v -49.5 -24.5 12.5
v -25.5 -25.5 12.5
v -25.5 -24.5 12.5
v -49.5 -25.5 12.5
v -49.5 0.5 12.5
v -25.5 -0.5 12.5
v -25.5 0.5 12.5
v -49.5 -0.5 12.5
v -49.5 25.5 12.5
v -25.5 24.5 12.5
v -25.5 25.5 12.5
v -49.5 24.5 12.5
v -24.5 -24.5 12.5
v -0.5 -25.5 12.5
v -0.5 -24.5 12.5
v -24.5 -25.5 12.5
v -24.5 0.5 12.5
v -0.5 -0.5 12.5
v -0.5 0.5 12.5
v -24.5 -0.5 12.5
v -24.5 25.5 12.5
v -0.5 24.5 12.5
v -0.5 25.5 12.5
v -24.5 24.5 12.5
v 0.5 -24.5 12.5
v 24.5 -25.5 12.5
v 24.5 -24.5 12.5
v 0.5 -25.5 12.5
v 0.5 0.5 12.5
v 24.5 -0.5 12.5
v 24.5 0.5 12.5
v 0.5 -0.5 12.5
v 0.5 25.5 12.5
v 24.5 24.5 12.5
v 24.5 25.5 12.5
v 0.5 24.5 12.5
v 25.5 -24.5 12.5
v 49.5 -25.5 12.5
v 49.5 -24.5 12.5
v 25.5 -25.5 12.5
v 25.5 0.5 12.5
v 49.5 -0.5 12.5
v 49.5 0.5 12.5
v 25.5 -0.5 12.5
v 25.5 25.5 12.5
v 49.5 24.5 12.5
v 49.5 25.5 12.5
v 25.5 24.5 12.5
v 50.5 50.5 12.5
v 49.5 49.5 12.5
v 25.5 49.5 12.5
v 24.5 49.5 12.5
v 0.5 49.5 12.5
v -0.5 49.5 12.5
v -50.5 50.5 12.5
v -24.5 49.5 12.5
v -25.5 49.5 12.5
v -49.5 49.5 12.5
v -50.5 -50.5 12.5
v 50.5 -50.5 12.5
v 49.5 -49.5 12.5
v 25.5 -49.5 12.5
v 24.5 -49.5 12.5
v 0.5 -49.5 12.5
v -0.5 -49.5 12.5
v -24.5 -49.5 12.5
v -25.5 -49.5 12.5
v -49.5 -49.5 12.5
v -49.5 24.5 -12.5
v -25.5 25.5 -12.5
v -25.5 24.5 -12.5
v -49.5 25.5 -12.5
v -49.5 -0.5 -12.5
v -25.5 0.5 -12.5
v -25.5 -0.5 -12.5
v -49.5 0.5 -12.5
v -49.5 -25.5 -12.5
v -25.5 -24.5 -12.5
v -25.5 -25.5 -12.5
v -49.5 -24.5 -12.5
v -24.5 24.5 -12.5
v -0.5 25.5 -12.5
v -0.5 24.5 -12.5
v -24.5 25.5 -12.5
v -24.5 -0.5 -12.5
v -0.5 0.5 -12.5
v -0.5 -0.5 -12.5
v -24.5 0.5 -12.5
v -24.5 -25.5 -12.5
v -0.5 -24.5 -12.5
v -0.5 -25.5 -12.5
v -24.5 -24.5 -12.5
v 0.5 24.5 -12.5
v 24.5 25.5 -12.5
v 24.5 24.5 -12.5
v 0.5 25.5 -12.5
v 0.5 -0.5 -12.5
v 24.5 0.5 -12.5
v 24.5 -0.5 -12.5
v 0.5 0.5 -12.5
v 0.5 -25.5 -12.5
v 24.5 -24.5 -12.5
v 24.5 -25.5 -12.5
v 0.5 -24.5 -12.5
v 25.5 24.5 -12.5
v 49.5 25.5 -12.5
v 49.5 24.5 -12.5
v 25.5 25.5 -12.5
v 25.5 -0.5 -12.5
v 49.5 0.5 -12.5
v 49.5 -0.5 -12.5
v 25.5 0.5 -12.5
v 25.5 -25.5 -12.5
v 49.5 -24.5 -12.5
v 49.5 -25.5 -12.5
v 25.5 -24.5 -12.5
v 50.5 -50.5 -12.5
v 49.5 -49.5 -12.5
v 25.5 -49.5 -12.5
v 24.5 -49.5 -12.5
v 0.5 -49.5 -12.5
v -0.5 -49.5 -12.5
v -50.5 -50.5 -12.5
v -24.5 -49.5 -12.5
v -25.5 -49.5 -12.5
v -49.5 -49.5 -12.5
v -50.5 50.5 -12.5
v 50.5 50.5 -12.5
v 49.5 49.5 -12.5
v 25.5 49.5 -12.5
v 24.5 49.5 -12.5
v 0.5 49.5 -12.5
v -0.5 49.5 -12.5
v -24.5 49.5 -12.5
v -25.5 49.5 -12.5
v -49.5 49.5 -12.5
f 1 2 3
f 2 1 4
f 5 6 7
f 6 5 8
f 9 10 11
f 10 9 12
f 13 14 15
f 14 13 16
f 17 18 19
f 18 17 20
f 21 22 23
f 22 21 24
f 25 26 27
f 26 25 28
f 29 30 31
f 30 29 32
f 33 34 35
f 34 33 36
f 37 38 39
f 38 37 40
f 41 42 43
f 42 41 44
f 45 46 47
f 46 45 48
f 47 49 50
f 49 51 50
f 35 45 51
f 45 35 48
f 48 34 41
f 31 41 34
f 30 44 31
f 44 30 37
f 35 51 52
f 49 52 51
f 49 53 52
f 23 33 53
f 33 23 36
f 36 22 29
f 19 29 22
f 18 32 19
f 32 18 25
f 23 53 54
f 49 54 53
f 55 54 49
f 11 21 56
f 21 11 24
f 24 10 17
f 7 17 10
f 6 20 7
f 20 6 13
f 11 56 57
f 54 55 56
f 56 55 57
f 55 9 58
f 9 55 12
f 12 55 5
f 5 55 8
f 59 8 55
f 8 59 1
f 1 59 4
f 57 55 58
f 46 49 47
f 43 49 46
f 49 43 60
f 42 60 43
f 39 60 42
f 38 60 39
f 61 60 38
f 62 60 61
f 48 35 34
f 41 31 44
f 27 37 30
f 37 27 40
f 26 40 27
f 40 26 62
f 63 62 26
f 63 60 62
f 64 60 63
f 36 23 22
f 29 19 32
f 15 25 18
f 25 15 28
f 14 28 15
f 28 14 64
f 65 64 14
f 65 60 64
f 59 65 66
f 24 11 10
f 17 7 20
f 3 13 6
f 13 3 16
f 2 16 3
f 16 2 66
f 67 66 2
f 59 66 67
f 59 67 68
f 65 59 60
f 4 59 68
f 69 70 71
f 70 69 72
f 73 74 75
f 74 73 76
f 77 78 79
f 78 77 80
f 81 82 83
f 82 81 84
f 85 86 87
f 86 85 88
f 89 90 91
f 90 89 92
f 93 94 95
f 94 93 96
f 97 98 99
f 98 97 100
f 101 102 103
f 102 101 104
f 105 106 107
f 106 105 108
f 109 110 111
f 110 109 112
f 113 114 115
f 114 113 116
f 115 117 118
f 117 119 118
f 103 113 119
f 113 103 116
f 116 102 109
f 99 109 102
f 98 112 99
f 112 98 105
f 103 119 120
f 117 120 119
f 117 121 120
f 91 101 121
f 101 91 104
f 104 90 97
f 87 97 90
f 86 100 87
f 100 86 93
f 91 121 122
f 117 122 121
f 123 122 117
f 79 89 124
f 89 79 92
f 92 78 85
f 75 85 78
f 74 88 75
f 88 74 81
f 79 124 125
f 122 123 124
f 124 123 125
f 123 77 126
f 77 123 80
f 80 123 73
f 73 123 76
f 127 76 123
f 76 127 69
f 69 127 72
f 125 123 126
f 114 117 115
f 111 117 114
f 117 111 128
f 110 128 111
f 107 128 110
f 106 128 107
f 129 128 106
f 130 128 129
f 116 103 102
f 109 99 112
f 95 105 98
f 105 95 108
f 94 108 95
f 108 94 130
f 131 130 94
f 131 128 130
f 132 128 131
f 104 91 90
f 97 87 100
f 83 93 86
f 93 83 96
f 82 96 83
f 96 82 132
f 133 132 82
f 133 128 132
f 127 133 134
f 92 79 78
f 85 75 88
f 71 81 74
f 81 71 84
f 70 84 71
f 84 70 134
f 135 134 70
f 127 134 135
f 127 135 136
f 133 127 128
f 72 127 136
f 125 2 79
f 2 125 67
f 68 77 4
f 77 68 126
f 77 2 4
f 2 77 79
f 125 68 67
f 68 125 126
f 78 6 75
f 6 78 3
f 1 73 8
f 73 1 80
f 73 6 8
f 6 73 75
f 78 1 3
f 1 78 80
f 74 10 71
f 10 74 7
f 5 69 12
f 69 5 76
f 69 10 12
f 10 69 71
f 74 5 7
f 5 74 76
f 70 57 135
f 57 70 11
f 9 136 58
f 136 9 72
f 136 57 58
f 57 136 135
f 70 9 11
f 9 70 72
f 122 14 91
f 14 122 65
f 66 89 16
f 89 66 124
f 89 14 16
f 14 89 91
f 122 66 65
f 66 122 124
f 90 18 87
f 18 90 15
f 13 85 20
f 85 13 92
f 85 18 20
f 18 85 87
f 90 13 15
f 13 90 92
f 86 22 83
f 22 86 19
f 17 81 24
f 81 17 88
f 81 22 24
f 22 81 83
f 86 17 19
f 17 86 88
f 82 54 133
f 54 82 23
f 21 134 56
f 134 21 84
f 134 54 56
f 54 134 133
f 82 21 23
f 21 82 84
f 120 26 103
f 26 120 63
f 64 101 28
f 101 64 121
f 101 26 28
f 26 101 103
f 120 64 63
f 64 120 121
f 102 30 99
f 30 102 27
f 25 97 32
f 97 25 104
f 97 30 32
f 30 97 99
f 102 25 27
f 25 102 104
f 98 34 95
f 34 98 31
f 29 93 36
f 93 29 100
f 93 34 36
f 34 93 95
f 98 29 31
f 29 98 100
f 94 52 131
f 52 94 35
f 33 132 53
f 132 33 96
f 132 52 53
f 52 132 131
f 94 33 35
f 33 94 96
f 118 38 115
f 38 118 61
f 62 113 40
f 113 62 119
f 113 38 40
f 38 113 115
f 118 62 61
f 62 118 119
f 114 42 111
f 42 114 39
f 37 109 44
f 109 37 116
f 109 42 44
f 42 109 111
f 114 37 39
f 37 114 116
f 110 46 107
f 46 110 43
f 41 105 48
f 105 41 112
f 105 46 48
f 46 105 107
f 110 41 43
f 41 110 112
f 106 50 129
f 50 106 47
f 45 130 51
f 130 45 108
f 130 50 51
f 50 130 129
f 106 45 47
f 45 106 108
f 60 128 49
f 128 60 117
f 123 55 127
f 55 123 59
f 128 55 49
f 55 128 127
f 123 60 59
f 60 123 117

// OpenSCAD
// ************************************************************
// * This model is gracefully offered by cookityourself
// * Feel free to do what you want with it
// * Please just add a link to our website www.ciy.fr 
// * if you use some of our code in your own creations
// ************************************************************
// * Ce modèle vous est gracieusement offert par cookityourself
// * Vous êtes libres de l'utiliser comme bon vous semble
// * Nous vous demandons seulement de faire un lien vers notre 
// * site web www.ciy.fr si vous l'utilisez pour l'une de vos
// * créations
// ************************************************************
// Model for a mold or cutter for a set of minecraft blocks
// ************************************************************

scale([1/1,1/1,1/1]){

  block_e = 25; // edge of each block
  nb_by_line = 4; // generate a mold of nb_by_line * nb_by_line blocks
  walls_t = 2; // wall thickness, should be a multiple of the noze diameter 

  block_mold(block_e, nb_by_line, walls_t);
  
}


// ************************************************************
// * Submodules
// ************************************************************

module block_mold(block_e, nb_by_line, walls_t) {
  
  center_xy = (nb_by_line/2 - 1/2)*block_e;
  
  translate ([-center_xy, -center_xy, 0]) for (i_line = [0:nb_by_line-1]) {
    for (i_col = [0:nb_by_line-1]) {
      translate ([i_line*block_e, i_col*block_e, 0]) block(block_e, block_e, walls_t);
    }
  }
  block(nb_by_line*block_e+walls_t/2, block_e, walls_t);
}

module block(block_e, block_h, walls_t) {
  
  hole_e = block_e-walls_t/2;
  hole_h = 2*block_h;
  
  difference () {
    cube ([block_e, block_e, block_h], center = true);
    cube ([hole_e, hole_e, hole_h], center = true);
  }
}
